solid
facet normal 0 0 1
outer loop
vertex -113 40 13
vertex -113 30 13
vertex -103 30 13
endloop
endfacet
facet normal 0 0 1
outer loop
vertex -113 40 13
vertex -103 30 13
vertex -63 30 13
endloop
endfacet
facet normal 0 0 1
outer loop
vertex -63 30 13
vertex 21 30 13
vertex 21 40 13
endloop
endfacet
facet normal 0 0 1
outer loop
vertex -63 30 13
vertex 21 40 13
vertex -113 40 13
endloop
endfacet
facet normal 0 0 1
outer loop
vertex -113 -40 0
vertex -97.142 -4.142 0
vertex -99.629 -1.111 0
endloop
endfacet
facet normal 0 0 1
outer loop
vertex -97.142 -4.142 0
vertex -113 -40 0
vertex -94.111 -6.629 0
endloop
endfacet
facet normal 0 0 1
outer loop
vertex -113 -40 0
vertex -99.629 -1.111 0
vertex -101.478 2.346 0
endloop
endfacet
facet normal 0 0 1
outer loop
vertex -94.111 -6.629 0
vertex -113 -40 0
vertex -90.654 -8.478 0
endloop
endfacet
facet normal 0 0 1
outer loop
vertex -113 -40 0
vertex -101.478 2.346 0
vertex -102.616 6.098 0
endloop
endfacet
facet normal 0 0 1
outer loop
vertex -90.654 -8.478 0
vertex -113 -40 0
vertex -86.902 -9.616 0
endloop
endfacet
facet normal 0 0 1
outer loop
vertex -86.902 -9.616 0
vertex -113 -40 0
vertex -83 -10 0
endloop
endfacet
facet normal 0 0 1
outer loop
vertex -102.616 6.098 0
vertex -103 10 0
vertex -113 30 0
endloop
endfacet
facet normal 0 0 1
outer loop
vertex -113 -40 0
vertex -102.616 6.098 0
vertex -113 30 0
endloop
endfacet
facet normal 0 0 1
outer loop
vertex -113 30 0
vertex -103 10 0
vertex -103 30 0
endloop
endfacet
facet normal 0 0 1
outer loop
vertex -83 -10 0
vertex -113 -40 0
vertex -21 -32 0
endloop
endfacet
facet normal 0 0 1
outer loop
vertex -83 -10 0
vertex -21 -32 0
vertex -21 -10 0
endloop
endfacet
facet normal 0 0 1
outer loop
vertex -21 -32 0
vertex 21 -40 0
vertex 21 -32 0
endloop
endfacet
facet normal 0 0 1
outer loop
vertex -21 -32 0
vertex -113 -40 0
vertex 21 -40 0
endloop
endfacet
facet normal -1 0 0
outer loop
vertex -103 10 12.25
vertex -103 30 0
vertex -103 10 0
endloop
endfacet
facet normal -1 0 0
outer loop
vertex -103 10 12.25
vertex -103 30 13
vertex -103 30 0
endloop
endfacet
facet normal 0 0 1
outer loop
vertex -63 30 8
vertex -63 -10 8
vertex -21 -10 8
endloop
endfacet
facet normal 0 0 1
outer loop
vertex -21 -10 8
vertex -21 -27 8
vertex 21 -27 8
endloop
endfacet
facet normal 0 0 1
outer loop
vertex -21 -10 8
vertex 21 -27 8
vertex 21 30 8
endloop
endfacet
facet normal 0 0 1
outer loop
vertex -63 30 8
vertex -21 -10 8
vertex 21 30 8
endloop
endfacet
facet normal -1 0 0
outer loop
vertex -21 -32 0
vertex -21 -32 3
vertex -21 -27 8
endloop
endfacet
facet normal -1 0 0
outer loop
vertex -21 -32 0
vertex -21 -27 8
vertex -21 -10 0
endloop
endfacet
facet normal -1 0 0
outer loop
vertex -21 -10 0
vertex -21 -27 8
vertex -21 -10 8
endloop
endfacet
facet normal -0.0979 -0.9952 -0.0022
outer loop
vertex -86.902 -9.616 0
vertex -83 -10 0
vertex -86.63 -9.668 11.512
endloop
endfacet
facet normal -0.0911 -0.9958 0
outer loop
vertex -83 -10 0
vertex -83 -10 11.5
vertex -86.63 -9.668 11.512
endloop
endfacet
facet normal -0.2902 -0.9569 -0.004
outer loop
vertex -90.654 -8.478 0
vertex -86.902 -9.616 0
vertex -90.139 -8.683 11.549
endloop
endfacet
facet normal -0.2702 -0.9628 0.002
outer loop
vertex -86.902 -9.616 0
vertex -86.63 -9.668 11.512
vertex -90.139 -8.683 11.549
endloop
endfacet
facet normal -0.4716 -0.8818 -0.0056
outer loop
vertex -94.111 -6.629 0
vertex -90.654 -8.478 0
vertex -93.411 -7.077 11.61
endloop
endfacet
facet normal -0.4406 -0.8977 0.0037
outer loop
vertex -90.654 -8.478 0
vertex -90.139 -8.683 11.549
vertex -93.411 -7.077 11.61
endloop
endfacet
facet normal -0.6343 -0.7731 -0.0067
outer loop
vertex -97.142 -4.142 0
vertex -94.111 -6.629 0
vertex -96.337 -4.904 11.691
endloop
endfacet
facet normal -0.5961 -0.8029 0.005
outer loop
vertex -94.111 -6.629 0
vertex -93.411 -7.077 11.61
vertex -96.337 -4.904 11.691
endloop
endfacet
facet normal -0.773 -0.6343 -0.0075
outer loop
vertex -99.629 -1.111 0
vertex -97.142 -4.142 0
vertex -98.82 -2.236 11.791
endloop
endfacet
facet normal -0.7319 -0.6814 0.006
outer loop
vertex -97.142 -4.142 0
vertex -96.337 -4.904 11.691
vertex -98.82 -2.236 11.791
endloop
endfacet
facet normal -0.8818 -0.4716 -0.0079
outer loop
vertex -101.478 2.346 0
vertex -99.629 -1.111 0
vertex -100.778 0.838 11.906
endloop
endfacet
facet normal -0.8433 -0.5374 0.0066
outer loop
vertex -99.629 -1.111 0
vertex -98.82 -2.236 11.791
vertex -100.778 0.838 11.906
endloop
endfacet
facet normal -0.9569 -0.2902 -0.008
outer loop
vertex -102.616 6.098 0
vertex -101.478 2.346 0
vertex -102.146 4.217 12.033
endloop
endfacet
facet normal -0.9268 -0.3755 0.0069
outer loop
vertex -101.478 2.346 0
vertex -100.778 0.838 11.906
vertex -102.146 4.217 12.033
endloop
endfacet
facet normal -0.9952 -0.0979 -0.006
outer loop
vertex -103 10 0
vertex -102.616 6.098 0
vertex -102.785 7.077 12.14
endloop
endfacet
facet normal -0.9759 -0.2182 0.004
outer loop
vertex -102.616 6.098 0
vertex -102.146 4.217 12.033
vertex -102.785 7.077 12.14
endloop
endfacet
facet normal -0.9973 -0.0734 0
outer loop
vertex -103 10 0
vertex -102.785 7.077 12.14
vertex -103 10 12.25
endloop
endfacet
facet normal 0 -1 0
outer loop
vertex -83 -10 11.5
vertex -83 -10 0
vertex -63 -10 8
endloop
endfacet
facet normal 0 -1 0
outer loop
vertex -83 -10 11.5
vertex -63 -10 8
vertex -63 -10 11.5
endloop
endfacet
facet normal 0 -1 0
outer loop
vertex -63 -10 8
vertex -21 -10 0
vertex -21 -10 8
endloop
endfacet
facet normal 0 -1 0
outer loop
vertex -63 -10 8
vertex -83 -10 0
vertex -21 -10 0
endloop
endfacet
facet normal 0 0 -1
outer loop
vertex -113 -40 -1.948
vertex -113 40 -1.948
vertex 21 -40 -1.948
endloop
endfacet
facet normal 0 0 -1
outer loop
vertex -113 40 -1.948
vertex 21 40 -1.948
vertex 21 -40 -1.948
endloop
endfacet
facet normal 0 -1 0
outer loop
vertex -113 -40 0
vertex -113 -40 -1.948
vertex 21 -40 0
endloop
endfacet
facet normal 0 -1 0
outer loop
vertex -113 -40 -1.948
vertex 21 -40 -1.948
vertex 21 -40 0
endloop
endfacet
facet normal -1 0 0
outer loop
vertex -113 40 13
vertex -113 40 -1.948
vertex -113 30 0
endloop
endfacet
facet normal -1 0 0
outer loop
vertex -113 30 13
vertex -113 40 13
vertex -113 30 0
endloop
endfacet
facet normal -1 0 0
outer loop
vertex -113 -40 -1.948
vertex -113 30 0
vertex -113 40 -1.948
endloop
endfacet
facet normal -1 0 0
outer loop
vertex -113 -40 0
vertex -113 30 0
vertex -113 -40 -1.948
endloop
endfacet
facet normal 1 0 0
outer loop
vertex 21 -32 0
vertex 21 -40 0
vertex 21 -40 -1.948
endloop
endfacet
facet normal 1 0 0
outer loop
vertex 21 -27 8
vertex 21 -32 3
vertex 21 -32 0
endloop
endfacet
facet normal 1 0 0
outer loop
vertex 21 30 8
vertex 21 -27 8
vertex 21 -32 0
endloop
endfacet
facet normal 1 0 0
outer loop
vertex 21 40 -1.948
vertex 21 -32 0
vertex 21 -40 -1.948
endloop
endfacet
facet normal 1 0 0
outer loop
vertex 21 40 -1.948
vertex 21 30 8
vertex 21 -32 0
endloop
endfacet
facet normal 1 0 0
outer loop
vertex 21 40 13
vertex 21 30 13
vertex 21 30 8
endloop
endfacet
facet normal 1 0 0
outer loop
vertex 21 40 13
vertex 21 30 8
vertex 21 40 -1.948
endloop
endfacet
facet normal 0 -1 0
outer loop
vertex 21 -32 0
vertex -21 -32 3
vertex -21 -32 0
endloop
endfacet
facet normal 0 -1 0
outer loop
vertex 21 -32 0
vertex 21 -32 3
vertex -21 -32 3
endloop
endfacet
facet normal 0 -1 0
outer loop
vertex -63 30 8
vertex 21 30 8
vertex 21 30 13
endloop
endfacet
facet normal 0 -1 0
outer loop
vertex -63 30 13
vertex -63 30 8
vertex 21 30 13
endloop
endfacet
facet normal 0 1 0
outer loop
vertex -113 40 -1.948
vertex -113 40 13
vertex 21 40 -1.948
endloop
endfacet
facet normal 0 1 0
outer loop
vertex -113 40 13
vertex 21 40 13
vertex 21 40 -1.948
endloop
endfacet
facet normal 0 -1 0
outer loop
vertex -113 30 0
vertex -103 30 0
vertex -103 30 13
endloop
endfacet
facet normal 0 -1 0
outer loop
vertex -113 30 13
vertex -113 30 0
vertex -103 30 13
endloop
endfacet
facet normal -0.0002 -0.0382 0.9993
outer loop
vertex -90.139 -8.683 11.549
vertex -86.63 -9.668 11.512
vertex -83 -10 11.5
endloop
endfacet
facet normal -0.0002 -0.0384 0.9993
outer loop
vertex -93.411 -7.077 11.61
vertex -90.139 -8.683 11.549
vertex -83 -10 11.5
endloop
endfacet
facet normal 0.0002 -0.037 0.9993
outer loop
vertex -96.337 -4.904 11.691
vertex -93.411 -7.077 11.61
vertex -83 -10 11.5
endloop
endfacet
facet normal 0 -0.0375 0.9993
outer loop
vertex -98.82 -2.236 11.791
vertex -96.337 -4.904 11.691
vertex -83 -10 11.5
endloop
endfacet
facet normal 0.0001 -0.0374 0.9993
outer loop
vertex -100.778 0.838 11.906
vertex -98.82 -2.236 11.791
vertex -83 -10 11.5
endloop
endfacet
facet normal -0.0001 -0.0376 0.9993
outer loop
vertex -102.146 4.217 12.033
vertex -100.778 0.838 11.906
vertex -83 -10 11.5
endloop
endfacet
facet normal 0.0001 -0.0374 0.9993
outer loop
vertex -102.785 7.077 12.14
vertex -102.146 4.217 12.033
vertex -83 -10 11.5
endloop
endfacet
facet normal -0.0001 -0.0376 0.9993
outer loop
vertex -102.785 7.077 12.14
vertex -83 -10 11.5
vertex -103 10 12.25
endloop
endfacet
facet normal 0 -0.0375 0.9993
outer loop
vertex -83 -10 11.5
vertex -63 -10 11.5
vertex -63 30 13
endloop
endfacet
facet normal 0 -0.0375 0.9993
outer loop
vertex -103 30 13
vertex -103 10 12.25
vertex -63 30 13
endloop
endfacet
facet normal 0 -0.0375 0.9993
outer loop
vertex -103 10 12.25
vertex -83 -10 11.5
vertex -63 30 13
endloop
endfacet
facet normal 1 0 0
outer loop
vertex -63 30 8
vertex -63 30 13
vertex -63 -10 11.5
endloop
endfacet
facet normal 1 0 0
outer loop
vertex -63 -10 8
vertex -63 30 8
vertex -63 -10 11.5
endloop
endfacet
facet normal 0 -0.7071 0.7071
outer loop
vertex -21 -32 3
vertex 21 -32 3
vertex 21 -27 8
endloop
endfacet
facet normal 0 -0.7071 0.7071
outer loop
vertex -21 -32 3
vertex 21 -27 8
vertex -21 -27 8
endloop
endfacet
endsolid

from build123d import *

# Parameters (mm, degrees)
F1_DEPTH = 21
F3_DEPTH = 42
F5_DEPTH = 50
F7_DEPTH = 50
F8_W     = 40
F8_H     = 8
F9_DEPTH = 40
F10_R    = 20
F11_SIZE = 5


with BuildPart() as f1:
    # F0 (on Right) → F1 (new body, symmetric)
    with BuildSketch(Plane.YZ):
        Polygon((40, 0), (0, 0), (-32, 0), (-40, 0), (-40, -1.9478090107), (40, -1.9478090107), align=None)
        Polygon((-32, 0), (0, 0), (40, 0), (40, 13), (30, 13), (30, 8), (-32, 8), align=None)
    extrude(amount=F1_DEPTH, both=True)

    # F2 (on face) → F3 (join)
    with BuildSketch(Plane(origin=(-21, 0, 0), x_dir=(0, -1, 0), z_dir=(-1, 0, 0))):
        Polygon((-30, 13), (-40, 13), (-40, -1.9478090107), (40, -1.9478090107), (40, 0), (32, 0), (10, 0), (10, 8), (-30, 8), align=None)
    extrude(amount=F3_DEPTH)

    # F4 (on face) → F5 (join)
    with BuildSketch(Plane(origin=(-63, 0, 0), x_dir=(0, -1, 0), z_dir=(-1, 0, 0))):
        Polygon((-40, 0), (-40, -1.9478090107), (40, -1.9478090107), (40, 0), (10, 0), align=None)
    extrude(amount=F5_DEPTH)

    # F6 (on face) → F7 (join)
    with BuildSketch(Plane(origin=(-63, 0, 0), x_dir=(0, -1, 0), z_dir=(-1, 0, 0))):
        Polygon((-30, 13), (-40, 13), (-40, 0), (-30, 0), (-30, 8), align=None)
    extrude(amount=F7_DEPTH)

    # F8 (on face) → F9 (join)
    with BuildSketch(Plane(origin=(-63, 0, 0), x_dir=(0, -1, 0), z_dir=(-1, 0, 0))):
        Polygon((-30, 13), (-30, 8), (10, 8), (10, 11.5), align=None)
        with Locations((-10, 4)):
            Rectangle(F8_W, F8_H)
    extrude(amount=F9_DEPTH)

    # F10
    f10_edges = [f1.edges().sort_by_distance(p)[0] for p in [
        (-103, -10, 5.75),
    ]]
    fillet(f10_edges, radius=F10_R)

    # F11
    f11_edges = [f1.edges().sort_by_distance(p)[0] for p in [
        (0, -32, 8),
    ]]
    chamfer(f11_edges, length=F11_SIZE)


solid = f1.part
